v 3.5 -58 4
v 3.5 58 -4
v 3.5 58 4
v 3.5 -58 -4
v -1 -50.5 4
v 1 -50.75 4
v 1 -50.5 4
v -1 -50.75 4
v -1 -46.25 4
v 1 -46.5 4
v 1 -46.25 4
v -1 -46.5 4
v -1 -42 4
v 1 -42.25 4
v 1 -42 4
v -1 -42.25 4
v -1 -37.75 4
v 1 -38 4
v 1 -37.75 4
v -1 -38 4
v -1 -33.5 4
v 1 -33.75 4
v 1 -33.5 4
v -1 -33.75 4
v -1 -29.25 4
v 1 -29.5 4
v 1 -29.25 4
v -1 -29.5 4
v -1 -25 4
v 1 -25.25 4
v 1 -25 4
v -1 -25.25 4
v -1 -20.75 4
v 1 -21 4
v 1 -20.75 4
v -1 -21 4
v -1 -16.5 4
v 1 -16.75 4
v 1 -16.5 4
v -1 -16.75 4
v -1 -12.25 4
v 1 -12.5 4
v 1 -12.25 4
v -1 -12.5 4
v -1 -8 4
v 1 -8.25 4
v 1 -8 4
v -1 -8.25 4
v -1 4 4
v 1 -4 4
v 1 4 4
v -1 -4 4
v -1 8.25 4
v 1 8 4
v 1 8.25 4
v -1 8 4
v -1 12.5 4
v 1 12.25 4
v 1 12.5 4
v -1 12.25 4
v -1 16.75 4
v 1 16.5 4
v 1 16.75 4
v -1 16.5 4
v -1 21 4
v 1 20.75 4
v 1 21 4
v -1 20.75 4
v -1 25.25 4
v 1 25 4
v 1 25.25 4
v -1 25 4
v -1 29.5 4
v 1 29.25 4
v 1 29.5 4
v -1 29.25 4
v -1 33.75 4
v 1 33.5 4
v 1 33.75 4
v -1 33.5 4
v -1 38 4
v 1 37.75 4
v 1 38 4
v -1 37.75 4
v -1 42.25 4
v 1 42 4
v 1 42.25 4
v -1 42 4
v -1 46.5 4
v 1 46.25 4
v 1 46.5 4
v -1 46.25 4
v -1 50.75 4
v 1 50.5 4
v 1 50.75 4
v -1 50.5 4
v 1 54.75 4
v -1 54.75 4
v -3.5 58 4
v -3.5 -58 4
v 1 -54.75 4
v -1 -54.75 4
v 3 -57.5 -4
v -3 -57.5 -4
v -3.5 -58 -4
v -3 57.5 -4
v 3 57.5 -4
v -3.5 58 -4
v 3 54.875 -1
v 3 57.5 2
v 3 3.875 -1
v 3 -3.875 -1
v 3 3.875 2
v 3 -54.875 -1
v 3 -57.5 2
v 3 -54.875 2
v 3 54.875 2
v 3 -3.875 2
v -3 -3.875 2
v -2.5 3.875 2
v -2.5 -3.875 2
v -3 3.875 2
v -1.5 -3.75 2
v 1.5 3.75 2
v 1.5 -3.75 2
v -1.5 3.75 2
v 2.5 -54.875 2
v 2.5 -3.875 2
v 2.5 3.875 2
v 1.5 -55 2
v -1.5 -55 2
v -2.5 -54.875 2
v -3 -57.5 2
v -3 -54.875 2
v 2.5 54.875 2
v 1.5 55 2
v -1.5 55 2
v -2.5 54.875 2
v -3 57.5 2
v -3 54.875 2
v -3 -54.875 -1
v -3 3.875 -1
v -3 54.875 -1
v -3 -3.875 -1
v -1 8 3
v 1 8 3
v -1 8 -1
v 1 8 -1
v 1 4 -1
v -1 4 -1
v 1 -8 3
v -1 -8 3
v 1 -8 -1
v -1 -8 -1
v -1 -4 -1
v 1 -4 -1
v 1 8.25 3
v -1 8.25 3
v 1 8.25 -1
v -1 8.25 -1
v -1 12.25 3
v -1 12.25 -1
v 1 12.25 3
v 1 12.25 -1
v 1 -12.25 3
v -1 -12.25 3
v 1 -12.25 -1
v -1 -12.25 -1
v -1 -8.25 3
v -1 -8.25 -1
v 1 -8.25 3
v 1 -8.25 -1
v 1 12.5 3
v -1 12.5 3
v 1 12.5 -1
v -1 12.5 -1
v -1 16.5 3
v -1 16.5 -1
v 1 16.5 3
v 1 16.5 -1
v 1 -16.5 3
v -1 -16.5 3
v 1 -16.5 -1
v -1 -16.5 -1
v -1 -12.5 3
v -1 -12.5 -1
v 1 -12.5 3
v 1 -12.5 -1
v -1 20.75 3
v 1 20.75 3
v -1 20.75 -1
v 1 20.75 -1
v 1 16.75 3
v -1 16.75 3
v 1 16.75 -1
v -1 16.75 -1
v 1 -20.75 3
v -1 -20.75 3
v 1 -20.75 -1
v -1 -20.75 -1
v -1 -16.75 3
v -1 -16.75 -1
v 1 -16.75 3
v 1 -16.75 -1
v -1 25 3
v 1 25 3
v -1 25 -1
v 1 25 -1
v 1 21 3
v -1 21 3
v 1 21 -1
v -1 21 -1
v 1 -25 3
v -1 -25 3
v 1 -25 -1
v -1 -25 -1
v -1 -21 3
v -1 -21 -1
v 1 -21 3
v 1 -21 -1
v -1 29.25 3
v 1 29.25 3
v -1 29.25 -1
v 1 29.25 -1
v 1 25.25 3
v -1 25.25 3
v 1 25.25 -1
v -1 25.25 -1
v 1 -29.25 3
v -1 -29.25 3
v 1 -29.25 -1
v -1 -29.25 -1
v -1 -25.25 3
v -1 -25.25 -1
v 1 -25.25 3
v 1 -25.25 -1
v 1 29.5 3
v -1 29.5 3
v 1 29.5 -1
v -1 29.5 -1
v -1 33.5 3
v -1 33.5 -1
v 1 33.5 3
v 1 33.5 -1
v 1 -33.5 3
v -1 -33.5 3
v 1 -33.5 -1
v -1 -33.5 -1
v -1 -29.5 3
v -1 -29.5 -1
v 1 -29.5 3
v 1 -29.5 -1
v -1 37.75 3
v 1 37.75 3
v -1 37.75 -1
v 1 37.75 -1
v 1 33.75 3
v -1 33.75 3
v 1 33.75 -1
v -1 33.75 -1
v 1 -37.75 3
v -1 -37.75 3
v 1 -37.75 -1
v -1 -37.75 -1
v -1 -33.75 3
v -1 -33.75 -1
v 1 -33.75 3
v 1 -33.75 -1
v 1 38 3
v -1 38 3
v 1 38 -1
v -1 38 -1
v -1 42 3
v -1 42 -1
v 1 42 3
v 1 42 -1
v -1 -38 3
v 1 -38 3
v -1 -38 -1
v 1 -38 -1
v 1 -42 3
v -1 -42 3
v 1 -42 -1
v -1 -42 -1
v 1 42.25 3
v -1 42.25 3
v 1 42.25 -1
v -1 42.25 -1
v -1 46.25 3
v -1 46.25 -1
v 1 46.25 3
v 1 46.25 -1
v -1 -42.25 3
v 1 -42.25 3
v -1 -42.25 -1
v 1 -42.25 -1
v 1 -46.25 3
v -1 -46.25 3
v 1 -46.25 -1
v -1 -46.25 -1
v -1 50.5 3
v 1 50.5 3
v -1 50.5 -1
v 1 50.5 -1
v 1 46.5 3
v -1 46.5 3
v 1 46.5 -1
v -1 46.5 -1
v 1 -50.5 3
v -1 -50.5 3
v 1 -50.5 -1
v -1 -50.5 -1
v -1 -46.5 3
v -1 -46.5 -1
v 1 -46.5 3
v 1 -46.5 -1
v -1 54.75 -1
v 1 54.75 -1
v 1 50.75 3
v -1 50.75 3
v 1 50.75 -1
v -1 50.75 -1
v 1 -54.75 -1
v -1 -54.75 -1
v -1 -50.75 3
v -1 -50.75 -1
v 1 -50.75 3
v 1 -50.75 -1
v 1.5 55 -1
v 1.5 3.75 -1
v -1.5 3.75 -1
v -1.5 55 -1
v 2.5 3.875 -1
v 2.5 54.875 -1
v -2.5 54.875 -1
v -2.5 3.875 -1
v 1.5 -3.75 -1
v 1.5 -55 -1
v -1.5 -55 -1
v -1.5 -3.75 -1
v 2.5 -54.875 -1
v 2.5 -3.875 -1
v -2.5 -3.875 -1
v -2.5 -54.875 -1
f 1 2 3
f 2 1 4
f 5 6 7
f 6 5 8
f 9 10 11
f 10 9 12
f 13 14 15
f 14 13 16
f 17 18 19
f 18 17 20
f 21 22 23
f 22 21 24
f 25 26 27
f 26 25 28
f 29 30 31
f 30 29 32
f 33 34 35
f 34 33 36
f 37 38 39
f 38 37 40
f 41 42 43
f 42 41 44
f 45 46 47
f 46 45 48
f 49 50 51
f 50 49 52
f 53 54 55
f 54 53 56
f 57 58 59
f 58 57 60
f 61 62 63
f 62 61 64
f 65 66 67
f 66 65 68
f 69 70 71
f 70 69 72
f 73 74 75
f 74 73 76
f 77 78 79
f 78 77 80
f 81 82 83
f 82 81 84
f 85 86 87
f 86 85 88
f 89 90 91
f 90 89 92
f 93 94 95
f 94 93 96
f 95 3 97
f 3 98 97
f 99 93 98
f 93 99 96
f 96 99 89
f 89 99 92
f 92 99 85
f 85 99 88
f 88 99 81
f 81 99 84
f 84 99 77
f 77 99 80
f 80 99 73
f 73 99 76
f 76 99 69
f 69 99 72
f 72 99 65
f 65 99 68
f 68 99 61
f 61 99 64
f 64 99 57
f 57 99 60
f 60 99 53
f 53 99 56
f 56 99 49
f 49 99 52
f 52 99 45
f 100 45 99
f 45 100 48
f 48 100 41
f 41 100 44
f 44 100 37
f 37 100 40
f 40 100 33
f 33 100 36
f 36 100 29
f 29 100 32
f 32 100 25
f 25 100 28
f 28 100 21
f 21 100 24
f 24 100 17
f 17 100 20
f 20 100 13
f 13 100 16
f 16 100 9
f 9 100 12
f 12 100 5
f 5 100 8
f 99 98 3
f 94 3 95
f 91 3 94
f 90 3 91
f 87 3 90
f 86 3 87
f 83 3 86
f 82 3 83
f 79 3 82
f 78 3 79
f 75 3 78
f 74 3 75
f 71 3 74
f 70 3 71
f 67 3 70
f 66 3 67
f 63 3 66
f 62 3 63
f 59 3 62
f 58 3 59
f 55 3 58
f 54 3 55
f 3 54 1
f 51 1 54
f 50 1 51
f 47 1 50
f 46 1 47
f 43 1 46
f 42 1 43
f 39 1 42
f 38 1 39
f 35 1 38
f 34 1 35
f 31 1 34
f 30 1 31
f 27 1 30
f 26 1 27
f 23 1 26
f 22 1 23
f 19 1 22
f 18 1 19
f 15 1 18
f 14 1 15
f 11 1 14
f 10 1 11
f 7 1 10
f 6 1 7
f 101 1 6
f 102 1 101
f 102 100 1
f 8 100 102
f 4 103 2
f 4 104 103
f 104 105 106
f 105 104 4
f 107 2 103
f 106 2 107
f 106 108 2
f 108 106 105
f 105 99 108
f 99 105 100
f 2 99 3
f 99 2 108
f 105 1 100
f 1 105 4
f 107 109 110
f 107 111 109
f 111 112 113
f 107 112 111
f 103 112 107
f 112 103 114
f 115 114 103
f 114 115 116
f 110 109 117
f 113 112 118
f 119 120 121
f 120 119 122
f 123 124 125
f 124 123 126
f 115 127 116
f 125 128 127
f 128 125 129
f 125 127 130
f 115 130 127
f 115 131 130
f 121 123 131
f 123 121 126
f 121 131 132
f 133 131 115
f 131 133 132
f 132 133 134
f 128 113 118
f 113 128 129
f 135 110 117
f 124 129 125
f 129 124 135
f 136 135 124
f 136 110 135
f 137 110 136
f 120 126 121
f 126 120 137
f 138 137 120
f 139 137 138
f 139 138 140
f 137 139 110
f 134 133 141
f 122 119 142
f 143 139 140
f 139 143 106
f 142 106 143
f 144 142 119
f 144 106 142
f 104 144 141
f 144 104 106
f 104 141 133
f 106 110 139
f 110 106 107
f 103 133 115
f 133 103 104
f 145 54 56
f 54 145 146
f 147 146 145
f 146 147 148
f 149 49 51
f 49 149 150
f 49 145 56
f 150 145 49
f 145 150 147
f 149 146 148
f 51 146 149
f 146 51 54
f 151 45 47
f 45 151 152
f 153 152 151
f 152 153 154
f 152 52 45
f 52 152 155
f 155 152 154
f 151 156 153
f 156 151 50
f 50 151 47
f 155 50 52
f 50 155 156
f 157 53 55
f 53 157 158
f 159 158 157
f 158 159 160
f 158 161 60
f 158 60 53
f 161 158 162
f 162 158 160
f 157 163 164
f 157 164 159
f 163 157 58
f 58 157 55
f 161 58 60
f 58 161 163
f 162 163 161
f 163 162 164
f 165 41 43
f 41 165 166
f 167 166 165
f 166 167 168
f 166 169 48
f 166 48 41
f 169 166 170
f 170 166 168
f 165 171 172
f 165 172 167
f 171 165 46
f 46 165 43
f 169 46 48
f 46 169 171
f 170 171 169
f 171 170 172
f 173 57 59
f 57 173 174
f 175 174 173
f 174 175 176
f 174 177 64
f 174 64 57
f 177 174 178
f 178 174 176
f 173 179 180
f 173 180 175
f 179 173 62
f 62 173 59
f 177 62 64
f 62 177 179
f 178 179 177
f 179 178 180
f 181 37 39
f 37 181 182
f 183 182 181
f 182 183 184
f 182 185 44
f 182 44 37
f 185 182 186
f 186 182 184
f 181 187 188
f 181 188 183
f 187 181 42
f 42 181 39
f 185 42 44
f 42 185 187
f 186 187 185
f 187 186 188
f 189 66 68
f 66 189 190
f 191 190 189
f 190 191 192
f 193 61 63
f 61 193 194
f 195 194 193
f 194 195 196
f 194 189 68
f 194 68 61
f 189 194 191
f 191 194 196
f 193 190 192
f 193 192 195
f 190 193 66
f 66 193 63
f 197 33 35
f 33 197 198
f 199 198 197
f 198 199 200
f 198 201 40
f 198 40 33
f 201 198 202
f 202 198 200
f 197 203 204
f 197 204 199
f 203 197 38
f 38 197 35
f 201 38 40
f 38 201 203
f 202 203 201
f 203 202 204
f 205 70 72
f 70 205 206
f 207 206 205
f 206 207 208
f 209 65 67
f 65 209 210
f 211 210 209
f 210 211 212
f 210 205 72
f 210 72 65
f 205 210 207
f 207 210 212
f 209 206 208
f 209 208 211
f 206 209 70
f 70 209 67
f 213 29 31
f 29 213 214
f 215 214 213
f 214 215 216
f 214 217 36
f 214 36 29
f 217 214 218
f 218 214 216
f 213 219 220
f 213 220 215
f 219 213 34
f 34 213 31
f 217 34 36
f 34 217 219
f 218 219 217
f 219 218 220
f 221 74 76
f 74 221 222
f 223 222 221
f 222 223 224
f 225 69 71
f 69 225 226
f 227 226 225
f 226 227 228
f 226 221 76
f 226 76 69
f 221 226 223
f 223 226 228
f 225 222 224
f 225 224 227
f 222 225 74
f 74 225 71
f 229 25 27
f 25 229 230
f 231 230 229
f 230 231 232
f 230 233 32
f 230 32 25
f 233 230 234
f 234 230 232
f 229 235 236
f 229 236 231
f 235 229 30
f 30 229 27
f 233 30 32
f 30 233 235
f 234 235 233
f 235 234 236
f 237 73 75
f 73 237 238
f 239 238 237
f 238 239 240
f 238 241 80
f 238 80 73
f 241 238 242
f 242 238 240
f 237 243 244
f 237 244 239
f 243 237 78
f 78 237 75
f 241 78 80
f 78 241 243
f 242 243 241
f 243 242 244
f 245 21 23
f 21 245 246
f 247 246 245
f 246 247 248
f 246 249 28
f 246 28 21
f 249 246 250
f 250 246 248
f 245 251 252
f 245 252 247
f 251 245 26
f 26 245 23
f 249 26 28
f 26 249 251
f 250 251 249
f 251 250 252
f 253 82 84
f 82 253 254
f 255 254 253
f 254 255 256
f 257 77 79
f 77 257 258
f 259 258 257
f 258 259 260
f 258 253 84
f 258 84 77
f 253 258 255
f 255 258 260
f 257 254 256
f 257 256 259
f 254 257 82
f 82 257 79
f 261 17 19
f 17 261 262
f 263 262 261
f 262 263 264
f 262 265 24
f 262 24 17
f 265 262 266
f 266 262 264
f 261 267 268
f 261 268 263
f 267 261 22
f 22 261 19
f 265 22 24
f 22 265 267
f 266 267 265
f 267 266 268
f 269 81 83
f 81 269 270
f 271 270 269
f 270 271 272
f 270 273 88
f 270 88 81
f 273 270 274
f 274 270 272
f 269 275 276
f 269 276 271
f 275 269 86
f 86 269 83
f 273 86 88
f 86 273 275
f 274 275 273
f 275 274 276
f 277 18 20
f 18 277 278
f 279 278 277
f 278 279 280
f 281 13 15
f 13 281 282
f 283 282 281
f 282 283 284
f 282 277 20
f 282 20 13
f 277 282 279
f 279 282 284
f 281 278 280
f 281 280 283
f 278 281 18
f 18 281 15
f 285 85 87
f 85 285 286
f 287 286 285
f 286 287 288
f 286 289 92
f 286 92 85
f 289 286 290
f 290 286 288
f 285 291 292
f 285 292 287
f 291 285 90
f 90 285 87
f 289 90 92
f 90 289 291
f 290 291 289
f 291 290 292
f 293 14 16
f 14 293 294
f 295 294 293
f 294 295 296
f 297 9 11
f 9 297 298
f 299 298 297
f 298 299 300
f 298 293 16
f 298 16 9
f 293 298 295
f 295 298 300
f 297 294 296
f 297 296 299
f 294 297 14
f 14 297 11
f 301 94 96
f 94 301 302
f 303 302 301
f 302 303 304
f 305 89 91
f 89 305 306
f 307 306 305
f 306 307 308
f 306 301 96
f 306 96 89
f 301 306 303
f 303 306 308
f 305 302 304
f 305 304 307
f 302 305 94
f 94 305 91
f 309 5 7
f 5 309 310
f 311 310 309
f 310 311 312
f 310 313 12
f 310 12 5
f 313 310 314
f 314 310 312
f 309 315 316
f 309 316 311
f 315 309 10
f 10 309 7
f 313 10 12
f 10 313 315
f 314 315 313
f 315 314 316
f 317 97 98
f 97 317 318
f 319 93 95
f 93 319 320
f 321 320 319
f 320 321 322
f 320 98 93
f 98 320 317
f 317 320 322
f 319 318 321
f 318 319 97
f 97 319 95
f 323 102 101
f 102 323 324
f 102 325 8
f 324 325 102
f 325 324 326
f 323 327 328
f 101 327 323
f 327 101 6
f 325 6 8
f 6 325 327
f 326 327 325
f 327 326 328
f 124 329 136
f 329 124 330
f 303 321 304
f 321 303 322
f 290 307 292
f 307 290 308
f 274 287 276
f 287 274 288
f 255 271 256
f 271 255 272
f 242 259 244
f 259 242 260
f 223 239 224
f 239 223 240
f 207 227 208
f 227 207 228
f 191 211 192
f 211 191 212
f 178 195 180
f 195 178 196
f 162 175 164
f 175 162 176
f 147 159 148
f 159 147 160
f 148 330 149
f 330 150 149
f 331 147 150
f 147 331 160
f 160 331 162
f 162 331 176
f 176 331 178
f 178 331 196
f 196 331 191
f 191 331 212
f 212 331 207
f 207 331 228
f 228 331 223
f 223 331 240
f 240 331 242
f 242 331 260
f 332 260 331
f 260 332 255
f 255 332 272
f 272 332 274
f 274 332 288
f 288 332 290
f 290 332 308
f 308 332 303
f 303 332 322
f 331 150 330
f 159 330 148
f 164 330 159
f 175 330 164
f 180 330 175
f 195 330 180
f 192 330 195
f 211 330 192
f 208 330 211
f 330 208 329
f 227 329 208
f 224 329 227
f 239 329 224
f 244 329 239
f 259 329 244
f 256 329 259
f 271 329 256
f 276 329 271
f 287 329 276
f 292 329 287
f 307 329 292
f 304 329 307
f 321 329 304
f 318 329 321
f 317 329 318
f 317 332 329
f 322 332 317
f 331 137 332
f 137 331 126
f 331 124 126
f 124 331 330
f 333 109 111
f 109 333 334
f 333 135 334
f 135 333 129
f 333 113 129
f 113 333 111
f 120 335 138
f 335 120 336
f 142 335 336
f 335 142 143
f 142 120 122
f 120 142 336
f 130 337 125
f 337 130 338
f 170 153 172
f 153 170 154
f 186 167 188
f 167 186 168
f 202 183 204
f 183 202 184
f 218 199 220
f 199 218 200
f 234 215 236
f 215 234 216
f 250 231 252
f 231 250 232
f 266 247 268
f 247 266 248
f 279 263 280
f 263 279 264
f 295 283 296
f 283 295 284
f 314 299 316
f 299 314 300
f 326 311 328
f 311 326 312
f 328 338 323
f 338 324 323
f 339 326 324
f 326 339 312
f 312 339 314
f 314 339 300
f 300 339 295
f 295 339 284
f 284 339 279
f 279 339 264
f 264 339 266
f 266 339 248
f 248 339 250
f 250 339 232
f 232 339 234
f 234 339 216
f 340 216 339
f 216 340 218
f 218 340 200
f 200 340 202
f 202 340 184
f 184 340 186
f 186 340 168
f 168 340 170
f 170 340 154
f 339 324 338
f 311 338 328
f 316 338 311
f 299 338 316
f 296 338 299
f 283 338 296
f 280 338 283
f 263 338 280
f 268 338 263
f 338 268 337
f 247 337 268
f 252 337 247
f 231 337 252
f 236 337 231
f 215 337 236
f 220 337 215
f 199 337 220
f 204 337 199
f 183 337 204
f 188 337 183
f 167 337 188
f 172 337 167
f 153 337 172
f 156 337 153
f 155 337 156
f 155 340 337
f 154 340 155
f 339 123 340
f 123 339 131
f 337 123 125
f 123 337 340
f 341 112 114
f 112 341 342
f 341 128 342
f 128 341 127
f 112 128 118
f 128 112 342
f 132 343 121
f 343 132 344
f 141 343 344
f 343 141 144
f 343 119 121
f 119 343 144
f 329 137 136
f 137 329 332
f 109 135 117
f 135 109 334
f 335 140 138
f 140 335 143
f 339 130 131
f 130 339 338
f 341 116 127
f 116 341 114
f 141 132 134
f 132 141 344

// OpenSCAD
$fn=50;
$t=true;        //Abbreviation
$wth=1;         //Wall Thickness
$l=116;         //Length
$w=7;           //Width
$h=8;           //Height
$ow=4;          //LED Opening Width
$oiw=3.5;       //LED Opening Inside Width
$ol=2;          //LED Opening length
$os=.25;        //LED Opening Spacing
$ols=$ow+$os;   //Distance per LED
$olso=6;      //Offset for Center
$od=4;          //LED Opening Depth

module ledopening() {
    rotate([0,0,90]) cube([$ow,$ol,$wth*4], center=$t);
}

module ledconduit() {
    difference() {
        cube([$ol+1, $ow+$os*2, $h/2], center=$t);
        cube([$ol, $ow, $h/2], center=$t);
    }
    translate([($w/2)-$wth+.25,0,0]) cube([.5,$ols,$h/2], center=$t);
    translate([-($w/2)+$wth-.25,0,0]) cube([.5,$ols,$h/2], center=$t);
}

difference() {
    cube([$w,$l,$h], center=$t);
    translate([0,0,-$wth*2]) cube([$w-$wth,$l-$wth,$h], center=$t);
    translate([0,$olso,$h/2]) ledopening();         //LED #6
    translate([0,-$olso,$h/2]) ledopening();        //LED #7
    translate([0,$olso+$ols,$h/2]) ledopening();    //LED #5
    translate([0,-$olso-$ols,$h/2]) ledopening();   //LED #8
    translate([0,$olso+$ols*2,$h/2]) ledopening();  //LED #4
    translate([0,-$olso-$ols*2,$h/2]) ledopening(); //LED #9
    translate([0,$olso+$ols*3,$h/2]) ledopening();  //LED #3
    translate([0,-$olso-$ols*3,$h/2]) ledopening(); //LED #10
    translate([0,$olso+$ols*4,$h/2]) ledopening();  //LED #2
    translate([0,-$olso-$ols*4,$h/2]) ledopening(); //LED #11
    translate([0,$olso+$ols*5,$h/2]) ledopening();  //LED #1
    translate([0,-$olso-$ols*5,$h/2]) ledopening(); //LED #12
    translate([0,$olso+$ols*6,$h/2]) ledopening();  //LED #1
    translate([0,-$olso-$ols*6,$h/2]) ledopening(); //LED #12
    translate([0,$olso+$ols*7,$h/2]) ledopening();  //LED #1
    translate([0,-$olso-$ols*7,$h/2]) ledopening(); //LED #12
    translate([0,$olso+$ols*8,$h/2]) ledopening();  //LED #1
    translate([0,-$olso-$ols*8,$h/2]) ledopening(); //LED #12
    translate([0,$olso+$ols*9,$h/2]) ledopening();  //LED #1
    translate([0,-$olso-$ols*9,$h/2]) ledopening(); //LED #12
    translate([0,$olso+$ols*10,$h/2]) ledopening();  //LED #1
    translate([0,-$olso-$ols*10,$h/2]) ledopening(); //LED #12
    translate([0,$olso+$ols*11,$h/2]) ledopening();  //LED #1
    translate([0,-$olso-$ols*11,$h/2]) ledopening(); //LED #12
}
//translate([0,$olso,$h]) ledconduit();
translate([0,$olso,1]) ledconduit();                //LED Conduit #6
translate([0,-$olso,1]) ledconduit();               //LED Conduit #7
translate([0,$olso+$ols,1]) ledconduit();           //LED Conduit #5
translate([0,-$olso-$ols,1]) ledconduit();          //LED Conduit #8
translate([0,$olso+$ols*2,1]) ledconduit();         //LED Conduit #4
translate([0,-$olso-$ols*2,1]) ledconduit();        //LED Conduit #9
translate([0,$olso+$ols*3,1]) ledconduit();         //LED Conduit #3
translate([0,-$olso-$ols*3,1]) ledconduit();        //LED Conduit #10
translate([0,$olso+$ols*4,1]) ledconduit();         //LED Conduit #2
translate([0,-$olso-$ols*4,1]) ledconduit();        //LED Conduit #11
translate([0,$olso+$ols*5,1]) ledconduit();         //LED Conduit #1
translate([0,-$olso-$ols*5,1]) ledconduit();        //LED Conduit #12
translate([0,$olso+$ols*6,1]) ledconduit();         //LED Conduit #1
translate([0,-$olso-$ols*6,1]) ledconduit();        //LED Conduit #12
translate([0,$olso+$ols*7,1]) ledconduit();         //LED Conduit #1
translate([0,-$olso-$ols*7,1]) ledconduit();        //LED Conduit #12
translate([0,$olso+$ols*8,1]) ledconduit();         //LED Conduit #1
translate([0,-$olso-$ols*8,1]) ledconduit();        //LED Conduit #12
translate([0,$olso+$ols*9,1]) ledconduit();         //LED Conduit #1
translate([0,-$olso-$ols*9,1]) ledconduit();        //LED Conduit #12
translate([0,$olso+$ols*10,1]) ledconduit();         //LED Conduit #1
translate([0,-$olso-$ols*10,1]) ledconduit();        //LED Conduit #12
translate([0,$olso+$ols*11,1]) ledconduit();         //LED Conduit #1
translate([0,-$olso-$ols*11,1]) ledconduit();        //LED Conduit #12
